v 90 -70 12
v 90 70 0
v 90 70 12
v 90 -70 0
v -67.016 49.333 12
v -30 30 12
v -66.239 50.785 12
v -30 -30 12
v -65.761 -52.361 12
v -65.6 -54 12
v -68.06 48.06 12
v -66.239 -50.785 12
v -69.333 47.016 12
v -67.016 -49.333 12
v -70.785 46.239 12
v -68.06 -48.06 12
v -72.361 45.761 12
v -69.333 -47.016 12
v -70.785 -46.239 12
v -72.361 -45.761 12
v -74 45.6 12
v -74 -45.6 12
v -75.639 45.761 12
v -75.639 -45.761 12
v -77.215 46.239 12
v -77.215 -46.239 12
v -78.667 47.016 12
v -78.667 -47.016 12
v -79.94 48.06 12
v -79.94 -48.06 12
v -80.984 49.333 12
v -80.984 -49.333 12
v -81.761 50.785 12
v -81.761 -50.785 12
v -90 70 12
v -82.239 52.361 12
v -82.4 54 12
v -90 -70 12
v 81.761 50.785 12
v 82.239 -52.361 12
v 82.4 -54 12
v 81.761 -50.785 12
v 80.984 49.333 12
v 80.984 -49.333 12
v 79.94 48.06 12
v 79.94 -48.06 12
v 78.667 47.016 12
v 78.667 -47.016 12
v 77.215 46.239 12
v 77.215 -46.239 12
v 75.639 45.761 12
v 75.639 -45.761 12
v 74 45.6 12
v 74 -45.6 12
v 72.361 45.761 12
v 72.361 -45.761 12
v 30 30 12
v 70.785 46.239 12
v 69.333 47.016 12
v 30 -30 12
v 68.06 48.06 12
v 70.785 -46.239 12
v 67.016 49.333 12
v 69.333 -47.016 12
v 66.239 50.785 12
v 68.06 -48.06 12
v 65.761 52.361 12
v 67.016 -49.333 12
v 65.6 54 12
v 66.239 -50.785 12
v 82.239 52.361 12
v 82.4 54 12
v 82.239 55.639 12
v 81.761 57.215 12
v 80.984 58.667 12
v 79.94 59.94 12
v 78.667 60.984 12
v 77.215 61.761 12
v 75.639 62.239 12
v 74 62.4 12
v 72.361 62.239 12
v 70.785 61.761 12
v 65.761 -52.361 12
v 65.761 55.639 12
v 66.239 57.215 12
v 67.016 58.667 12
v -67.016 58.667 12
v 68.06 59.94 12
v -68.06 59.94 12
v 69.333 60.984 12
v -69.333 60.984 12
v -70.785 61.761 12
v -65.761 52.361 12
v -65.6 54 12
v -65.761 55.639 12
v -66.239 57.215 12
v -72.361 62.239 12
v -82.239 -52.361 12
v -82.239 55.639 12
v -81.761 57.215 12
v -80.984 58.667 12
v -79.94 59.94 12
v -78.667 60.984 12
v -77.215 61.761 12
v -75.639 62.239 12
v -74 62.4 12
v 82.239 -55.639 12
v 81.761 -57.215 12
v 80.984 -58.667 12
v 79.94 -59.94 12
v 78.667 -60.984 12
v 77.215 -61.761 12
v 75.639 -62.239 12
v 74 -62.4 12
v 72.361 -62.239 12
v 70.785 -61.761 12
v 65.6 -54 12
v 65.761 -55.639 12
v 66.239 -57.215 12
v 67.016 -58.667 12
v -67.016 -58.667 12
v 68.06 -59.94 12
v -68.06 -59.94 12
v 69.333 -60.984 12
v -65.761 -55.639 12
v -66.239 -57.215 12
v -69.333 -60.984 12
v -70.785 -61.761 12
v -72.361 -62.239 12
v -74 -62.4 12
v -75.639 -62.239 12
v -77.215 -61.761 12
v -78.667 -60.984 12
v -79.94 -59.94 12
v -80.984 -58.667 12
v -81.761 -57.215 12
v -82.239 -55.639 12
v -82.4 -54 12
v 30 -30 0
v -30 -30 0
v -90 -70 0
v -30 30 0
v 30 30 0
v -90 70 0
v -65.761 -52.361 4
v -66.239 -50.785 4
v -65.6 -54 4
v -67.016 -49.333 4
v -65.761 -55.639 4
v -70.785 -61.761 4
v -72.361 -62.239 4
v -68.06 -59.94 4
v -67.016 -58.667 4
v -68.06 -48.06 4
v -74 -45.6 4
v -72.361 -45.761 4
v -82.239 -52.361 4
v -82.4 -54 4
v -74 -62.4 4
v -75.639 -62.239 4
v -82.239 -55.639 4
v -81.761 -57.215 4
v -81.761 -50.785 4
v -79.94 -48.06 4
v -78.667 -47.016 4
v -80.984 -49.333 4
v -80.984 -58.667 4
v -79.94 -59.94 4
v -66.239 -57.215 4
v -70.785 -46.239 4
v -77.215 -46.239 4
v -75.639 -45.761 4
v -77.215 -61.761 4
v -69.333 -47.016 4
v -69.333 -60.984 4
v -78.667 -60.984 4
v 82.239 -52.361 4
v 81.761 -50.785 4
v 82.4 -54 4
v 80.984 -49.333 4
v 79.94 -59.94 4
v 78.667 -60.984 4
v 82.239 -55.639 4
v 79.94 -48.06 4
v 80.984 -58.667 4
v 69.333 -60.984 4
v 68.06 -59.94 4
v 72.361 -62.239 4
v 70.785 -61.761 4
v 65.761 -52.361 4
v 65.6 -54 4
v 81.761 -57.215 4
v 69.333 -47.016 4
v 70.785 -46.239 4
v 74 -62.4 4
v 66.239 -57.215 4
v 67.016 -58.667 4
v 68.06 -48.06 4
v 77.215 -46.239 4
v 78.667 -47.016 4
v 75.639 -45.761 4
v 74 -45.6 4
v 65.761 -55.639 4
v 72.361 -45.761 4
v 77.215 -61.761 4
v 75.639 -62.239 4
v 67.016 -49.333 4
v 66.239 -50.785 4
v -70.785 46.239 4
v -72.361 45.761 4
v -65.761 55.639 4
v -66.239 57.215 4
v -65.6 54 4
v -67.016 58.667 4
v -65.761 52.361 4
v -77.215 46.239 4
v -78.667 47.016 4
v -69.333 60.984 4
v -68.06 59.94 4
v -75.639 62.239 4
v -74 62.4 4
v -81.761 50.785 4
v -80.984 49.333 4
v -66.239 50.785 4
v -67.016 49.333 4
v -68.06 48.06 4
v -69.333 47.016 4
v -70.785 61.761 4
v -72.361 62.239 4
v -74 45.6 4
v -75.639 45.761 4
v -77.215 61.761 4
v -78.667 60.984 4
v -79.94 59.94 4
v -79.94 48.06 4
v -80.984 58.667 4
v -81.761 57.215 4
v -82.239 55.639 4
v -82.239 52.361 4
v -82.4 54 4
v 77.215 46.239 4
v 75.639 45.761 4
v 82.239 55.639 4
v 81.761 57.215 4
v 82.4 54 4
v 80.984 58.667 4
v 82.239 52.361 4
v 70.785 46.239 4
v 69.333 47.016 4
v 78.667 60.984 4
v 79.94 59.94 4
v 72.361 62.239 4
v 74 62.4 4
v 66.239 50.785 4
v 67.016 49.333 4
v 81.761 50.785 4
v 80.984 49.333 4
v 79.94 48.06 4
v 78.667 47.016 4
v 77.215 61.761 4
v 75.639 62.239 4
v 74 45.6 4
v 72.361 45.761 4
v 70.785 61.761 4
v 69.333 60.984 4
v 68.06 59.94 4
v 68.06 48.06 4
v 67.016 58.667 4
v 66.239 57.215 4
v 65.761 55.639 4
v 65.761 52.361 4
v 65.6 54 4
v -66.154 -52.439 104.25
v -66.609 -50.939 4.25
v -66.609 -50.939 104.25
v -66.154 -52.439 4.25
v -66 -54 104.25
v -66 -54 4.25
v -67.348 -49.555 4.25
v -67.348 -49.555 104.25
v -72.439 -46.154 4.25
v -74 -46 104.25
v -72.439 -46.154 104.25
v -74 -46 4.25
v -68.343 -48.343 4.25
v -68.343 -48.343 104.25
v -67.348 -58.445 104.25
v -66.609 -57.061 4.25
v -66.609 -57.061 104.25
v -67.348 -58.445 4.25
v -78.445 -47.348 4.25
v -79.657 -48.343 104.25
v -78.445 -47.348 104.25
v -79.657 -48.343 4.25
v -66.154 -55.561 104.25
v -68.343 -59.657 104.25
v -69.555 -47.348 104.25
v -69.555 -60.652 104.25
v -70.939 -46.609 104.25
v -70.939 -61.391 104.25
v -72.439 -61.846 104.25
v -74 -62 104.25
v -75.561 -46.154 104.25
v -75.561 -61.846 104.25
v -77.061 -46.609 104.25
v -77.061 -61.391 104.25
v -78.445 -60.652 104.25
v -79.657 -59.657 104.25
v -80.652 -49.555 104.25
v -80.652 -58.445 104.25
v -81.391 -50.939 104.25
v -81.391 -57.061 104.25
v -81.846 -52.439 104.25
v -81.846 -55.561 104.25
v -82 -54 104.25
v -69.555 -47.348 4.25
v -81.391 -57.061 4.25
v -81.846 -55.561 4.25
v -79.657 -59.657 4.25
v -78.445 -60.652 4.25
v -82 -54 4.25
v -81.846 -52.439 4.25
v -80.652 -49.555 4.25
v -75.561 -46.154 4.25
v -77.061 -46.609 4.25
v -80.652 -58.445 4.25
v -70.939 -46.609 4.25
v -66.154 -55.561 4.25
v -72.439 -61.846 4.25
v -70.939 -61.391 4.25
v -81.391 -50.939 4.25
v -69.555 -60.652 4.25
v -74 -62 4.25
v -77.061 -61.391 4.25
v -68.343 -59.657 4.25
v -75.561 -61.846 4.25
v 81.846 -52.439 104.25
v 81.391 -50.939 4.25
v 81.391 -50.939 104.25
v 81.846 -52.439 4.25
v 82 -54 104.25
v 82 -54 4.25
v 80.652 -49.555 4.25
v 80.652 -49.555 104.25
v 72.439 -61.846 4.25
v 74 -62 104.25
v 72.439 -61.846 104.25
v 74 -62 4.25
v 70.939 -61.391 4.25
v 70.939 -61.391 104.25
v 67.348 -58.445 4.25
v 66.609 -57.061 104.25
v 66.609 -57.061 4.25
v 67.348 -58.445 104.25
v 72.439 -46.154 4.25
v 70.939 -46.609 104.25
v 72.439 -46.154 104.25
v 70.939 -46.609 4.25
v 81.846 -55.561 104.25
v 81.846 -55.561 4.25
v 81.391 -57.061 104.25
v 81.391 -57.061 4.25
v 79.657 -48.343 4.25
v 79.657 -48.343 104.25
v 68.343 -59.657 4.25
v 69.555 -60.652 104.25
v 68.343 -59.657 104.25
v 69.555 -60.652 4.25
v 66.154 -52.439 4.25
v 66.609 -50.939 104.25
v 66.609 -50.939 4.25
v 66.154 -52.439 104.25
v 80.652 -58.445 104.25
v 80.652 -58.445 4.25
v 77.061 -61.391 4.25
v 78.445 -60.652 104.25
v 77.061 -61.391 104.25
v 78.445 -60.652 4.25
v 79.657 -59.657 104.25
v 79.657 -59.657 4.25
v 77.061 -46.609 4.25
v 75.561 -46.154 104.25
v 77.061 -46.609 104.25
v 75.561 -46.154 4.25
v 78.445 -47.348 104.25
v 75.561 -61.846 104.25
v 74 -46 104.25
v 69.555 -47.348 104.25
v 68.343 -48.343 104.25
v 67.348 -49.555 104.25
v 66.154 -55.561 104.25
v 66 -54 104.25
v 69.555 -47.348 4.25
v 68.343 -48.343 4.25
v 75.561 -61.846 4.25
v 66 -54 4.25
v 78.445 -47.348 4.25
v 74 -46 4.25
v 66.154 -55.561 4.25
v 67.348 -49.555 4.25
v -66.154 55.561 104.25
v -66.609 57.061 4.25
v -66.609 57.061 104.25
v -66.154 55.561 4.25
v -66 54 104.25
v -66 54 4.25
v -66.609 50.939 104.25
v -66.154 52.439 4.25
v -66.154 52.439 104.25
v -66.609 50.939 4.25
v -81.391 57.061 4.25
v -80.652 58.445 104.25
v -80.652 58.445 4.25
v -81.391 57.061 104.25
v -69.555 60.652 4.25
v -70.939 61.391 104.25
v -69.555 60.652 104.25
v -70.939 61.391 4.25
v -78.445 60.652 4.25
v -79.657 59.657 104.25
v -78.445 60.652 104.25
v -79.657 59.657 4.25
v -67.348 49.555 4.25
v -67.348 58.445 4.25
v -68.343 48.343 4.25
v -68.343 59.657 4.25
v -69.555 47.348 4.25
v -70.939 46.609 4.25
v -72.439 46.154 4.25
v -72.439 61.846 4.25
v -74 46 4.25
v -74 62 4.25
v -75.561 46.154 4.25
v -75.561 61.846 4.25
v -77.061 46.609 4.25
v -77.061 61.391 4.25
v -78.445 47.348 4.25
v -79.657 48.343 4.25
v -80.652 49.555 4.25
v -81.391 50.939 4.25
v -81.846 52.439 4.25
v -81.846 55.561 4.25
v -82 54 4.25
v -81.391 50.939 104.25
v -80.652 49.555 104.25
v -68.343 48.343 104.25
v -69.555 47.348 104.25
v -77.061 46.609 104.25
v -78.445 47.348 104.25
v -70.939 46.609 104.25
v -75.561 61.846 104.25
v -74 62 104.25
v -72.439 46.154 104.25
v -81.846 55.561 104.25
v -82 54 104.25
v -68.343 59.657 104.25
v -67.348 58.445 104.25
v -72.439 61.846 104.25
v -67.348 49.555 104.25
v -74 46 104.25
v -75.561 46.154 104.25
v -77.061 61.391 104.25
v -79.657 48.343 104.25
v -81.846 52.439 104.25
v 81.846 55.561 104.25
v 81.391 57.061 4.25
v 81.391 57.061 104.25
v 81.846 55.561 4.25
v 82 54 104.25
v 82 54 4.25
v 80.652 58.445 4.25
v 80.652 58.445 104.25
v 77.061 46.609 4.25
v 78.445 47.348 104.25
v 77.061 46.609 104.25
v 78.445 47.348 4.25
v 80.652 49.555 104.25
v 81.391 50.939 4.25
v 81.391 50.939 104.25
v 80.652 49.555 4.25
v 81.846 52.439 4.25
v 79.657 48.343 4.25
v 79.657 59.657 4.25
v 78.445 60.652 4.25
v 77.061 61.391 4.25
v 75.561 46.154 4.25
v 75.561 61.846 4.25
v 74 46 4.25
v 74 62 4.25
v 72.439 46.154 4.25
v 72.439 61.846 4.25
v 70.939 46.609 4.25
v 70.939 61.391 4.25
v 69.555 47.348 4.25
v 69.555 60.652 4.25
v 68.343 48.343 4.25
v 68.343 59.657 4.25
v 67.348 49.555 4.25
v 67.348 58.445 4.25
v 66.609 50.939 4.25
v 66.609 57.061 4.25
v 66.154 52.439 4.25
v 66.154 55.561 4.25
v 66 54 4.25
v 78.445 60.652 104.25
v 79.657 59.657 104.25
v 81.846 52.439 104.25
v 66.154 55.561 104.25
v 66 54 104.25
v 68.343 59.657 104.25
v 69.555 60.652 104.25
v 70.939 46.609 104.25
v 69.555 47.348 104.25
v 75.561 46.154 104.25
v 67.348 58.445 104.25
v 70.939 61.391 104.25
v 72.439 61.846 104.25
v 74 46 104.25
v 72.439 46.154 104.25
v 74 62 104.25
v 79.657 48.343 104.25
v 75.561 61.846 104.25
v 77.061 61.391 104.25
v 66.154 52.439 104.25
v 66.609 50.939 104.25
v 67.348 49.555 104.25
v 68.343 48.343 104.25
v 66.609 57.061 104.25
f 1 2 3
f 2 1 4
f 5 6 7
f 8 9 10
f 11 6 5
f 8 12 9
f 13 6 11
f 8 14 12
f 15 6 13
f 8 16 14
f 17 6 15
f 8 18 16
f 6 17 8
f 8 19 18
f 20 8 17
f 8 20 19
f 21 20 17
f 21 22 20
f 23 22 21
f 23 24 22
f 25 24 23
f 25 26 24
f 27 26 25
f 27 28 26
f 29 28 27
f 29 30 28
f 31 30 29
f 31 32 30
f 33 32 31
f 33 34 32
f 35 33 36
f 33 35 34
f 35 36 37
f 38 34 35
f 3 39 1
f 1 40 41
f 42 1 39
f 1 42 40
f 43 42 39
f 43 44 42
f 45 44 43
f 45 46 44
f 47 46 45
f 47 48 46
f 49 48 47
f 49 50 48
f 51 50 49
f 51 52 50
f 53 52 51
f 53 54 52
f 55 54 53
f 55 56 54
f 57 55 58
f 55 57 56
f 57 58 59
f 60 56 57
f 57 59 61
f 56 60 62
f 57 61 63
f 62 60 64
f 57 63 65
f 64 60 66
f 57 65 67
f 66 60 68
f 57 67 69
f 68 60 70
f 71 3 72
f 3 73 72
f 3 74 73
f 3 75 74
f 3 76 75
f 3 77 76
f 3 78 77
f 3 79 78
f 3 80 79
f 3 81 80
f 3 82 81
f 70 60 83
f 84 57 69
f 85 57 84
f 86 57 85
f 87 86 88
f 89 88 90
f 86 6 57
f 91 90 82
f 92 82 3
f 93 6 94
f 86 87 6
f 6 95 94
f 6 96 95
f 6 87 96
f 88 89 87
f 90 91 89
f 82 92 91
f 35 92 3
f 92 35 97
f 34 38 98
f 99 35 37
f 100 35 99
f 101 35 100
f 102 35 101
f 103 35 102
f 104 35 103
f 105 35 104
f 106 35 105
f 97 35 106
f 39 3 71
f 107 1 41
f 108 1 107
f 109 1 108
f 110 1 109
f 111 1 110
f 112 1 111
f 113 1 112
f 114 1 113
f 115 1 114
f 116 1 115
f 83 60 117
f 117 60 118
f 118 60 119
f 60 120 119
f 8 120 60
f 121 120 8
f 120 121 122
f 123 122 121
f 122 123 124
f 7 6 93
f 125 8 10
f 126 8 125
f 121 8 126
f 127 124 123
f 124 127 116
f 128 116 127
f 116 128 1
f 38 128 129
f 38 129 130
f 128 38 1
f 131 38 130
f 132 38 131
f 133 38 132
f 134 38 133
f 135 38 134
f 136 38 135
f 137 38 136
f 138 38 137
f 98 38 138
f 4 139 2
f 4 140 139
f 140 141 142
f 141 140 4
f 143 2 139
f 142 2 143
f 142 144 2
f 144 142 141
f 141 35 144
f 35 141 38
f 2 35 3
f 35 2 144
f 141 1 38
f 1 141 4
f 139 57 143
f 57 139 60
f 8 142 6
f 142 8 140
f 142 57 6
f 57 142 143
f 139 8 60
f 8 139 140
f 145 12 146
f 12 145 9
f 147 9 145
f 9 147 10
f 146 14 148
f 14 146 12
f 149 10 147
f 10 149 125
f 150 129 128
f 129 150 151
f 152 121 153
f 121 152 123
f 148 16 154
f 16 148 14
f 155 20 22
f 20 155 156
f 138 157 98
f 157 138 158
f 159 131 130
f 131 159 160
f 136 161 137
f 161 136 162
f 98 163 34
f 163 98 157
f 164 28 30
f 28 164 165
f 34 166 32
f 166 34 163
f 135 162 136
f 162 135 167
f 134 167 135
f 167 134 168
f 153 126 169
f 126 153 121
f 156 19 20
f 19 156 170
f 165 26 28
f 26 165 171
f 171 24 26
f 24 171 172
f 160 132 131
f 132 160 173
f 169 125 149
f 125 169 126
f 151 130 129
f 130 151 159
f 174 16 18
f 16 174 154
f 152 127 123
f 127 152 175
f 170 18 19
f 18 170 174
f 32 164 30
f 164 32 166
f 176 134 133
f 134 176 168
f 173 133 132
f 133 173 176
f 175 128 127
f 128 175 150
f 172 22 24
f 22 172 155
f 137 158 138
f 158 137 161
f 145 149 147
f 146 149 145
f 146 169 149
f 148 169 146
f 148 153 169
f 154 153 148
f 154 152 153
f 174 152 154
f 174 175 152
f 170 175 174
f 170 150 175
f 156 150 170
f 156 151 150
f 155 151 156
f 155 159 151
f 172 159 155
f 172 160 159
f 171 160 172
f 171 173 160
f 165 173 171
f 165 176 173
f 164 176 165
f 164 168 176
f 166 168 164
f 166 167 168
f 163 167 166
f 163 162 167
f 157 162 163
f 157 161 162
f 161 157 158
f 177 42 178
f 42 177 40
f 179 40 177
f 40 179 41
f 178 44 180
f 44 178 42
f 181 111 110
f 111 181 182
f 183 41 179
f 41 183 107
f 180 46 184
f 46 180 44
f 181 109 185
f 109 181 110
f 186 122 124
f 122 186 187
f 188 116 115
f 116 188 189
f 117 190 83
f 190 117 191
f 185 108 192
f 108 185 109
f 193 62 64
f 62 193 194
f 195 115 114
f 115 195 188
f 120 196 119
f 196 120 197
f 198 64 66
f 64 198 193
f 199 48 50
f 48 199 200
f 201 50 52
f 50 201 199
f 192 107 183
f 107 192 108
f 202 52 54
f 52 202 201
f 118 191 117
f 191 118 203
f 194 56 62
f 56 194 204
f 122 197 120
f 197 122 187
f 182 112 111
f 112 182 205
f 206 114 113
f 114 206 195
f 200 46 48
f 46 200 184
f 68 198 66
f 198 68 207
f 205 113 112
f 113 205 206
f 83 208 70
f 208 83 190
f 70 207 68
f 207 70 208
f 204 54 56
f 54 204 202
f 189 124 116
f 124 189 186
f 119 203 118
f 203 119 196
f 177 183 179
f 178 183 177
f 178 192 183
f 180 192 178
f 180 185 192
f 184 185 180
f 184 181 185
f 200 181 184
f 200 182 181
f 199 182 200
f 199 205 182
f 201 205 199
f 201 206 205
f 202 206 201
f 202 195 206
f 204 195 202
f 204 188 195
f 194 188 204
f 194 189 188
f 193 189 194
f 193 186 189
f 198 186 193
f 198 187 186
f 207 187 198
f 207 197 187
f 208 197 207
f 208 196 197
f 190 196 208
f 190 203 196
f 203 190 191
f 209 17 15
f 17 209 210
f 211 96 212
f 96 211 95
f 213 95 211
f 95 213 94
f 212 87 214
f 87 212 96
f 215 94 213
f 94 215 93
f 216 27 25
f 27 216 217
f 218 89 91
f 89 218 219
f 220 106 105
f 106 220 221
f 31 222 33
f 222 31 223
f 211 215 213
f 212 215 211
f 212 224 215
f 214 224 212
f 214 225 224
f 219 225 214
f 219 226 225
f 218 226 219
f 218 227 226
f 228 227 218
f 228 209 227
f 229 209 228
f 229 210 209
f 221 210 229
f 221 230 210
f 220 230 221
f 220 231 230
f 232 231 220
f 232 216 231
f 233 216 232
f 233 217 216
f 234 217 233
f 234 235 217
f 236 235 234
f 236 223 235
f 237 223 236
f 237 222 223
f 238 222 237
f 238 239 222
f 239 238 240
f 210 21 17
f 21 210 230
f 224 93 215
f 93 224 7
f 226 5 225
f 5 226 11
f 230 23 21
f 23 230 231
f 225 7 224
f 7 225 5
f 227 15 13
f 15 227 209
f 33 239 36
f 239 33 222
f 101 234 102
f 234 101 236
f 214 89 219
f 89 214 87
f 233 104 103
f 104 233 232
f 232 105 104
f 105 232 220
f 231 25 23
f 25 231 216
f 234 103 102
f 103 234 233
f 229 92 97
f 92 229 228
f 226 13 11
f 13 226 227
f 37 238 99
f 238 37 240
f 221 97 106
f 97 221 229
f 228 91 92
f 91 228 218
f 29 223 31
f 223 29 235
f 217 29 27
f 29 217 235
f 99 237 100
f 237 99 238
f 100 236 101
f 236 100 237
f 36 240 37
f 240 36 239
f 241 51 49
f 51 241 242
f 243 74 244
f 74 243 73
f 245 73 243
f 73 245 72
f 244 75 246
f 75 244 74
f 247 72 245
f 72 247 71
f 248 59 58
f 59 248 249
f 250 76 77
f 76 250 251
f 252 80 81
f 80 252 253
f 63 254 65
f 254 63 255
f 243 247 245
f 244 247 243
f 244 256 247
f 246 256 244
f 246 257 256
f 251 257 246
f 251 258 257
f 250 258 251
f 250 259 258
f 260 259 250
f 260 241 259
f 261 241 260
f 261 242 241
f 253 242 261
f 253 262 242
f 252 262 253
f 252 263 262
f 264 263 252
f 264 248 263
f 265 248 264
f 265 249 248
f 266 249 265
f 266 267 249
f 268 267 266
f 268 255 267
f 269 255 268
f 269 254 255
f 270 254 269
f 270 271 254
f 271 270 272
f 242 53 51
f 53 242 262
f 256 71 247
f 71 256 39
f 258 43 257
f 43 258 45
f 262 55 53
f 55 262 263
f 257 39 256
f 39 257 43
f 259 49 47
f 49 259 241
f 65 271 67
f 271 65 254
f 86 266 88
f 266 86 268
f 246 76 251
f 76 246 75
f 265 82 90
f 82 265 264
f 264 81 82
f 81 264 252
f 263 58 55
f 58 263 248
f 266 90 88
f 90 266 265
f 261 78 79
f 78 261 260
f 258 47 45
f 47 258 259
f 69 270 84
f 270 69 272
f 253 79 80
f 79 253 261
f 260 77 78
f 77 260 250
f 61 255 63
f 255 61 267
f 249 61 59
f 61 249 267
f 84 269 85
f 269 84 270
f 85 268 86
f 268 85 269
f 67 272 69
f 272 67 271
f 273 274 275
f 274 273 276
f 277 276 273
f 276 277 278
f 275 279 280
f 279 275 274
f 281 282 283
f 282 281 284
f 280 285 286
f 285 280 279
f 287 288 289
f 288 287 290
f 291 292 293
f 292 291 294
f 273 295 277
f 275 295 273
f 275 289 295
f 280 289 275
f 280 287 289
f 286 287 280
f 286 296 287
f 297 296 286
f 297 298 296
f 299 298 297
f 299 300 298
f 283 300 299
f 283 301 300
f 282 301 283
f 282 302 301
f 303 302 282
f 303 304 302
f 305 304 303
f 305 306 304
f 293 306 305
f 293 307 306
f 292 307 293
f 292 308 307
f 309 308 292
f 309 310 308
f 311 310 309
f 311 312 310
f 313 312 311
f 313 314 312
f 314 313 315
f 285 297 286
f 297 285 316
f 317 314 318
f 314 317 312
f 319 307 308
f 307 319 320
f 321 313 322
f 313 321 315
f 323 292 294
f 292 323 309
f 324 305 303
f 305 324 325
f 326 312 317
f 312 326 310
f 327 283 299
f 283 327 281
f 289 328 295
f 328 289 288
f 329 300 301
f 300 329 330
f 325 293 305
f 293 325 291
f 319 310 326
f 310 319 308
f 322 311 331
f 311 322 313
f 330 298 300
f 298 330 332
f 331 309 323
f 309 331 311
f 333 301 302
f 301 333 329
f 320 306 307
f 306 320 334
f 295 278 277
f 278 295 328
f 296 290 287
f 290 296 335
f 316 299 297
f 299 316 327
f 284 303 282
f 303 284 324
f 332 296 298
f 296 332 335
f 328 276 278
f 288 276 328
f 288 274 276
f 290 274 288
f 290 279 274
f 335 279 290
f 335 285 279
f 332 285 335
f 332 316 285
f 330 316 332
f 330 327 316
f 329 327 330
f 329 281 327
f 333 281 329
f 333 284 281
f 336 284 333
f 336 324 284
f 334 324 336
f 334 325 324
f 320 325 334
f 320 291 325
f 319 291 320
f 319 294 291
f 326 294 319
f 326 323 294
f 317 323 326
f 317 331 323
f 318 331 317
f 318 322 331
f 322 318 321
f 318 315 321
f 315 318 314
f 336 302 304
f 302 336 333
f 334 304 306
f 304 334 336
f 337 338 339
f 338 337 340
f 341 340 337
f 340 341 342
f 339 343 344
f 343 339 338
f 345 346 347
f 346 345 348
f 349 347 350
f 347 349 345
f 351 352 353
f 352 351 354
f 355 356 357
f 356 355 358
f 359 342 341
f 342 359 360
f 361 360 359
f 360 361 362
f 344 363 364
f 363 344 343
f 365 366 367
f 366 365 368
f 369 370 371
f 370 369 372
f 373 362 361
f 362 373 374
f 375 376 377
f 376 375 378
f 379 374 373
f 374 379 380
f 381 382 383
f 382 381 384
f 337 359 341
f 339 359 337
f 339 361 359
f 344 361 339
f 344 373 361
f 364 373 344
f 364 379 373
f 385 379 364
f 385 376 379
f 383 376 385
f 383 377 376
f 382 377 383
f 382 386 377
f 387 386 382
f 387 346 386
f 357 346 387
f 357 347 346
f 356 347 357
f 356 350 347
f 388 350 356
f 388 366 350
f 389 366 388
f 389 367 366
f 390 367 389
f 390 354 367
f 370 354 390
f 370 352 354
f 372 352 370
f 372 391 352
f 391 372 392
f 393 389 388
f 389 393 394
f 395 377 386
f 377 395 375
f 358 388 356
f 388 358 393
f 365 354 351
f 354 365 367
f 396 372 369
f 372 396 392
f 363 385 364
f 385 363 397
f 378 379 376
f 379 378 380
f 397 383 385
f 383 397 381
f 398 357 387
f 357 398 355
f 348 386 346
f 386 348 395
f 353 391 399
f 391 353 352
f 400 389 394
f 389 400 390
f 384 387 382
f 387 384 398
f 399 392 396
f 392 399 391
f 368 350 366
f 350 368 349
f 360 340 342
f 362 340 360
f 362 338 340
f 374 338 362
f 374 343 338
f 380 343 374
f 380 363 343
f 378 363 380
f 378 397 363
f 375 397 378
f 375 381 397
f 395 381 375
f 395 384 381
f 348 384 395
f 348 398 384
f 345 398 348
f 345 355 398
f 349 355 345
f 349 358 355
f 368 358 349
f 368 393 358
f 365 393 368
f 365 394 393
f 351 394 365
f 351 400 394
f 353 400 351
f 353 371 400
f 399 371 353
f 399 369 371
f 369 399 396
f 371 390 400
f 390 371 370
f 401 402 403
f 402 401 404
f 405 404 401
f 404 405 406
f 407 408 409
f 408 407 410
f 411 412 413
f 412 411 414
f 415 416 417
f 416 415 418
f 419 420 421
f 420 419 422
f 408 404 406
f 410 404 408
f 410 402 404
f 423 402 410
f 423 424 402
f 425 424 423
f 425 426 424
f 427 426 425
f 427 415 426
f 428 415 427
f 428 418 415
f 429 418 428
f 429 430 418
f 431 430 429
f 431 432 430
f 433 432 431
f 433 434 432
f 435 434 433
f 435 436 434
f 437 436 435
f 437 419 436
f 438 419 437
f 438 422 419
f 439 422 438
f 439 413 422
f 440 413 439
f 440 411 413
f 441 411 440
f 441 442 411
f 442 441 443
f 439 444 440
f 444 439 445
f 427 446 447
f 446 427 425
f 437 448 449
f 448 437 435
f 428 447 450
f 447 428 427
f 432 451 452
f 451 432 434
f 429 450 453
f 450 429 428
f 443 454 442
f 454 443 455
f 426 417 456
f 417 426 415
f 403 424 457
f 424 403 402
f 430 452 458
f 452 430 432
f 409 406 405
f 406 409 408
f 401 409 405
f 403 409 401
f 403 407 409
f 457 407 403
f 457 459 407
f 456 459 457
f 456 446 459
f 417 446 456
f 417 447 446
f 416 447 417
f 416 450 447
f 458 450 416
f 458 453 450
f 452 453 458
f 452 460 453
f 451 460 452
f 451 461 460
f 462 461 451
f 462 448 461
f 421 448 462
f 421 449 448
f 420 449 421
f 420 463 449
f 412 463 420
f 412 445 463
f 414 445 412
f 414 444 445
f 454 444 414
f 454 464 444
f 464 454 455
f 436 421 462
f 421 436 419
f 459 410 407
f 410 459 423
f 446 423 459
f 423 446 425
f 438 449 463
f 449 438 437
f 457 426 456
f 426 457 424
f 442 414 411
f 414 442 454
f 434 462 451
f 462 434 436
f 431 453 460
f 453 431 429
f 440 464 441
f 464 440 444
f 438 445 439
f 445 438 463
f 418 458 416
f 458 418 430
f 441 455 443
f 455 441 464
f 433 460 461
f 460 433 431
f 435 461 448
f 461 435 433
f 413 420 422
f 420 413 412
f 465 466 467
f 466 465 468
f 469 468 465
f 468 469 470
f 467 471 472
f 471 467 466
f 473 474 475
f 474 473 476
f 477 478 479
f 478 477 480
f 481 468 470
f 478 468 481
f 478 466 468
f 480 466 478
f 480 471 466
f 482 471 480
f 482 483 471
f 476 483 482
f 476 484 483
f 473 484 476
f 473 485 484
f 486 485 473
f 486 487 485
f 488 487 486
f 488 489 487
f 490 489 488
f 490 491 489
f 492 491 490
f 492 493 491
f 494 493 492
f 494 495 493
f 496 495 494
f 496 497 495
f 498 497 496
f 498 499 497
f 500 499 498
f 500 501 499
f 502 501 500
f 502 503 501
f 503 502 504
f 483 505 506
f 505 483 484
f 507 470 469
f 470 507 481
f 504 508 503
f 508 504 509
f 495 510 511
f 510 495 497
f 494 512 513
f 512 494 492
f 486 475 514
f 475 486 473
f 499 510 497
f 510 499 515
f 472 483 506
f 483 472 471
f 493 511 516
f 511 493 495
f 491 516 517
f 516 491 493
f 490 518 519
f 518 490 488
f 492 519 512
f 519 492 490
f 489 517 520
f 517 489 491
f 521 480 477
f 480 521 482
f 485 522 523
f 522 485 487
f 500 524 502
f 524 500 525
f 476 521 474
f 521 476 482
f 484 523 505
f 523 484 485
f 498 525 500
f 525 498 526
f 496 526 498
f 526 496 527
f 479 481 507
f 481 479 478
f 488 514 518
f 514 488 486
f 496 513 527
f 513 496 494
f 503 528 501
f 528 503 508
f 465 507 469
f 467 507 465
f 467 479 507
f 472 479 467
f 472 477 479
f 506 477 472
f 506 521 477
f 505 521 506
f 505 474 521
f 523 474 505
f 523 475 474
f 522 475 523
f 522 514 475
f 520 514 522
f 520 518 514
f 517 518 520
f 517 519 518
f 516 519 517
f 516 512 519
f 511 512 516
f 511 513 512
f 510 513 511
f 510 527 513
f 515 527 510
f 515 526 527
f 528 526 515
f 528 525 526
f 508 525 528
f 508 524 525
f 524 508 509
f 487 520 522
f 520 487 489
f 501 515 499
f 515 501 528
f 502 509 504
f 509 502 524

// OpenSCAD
$fn = 32;

// ------------------------------------------------------------------------
// Frame with four posts: 180 x 140 mm frame, four d16 posts
// Every part is its own module, assembly() places them once.
// ------------------------------------------------------------------------

// --- part 1 ---
module base_frame() {
  difference() {
    translate([-90, -70, 0]) cube([180, 140, 12]);
    translate([-30, -30, -1]) cube([60, 60, 14]);
    translate([-74, -54, 4]) cylinder(h = 9, d = 16.8);
    translate([74, -54, 4]) cylinder(h = 9, d = 16.8);
    translate([-74, 54, 4]) cylinder(h = 9, d = 16.8);
    translate([74, 54, 4]) cylinder(h = 9, d = 16.8);
  }
}

// --- part 2 ---
module post1() {
  cylinder(h = 100, d = 16);
}

// --- part 3 ---
module post2() {
  cylinder(h = 100, d = 16);
}

// --- part 4 ---
module post3() {
  cylinder(h = 100, d = 16);
}

// --- part 5 ---
module post4() {
  cylinder(h = 100, d = 16);
}

// --- assembly ---
module assembly() {
  translate([0, 0, 0]) rotate([0, 0, 0]) base_frame();
  translate([-74, -54, 4.25]) rotate([0, 0, 0]) post1();
  translate([74, -54, 4.25]) rotate([0, 0, 0]) post2();
  translate([-74, 54, 4.25]) rotate([0, 0, 0]) post3();
  translate([74, 54, 4.25]) rotate([0, 0, 0]) post4();
}

assembly();
